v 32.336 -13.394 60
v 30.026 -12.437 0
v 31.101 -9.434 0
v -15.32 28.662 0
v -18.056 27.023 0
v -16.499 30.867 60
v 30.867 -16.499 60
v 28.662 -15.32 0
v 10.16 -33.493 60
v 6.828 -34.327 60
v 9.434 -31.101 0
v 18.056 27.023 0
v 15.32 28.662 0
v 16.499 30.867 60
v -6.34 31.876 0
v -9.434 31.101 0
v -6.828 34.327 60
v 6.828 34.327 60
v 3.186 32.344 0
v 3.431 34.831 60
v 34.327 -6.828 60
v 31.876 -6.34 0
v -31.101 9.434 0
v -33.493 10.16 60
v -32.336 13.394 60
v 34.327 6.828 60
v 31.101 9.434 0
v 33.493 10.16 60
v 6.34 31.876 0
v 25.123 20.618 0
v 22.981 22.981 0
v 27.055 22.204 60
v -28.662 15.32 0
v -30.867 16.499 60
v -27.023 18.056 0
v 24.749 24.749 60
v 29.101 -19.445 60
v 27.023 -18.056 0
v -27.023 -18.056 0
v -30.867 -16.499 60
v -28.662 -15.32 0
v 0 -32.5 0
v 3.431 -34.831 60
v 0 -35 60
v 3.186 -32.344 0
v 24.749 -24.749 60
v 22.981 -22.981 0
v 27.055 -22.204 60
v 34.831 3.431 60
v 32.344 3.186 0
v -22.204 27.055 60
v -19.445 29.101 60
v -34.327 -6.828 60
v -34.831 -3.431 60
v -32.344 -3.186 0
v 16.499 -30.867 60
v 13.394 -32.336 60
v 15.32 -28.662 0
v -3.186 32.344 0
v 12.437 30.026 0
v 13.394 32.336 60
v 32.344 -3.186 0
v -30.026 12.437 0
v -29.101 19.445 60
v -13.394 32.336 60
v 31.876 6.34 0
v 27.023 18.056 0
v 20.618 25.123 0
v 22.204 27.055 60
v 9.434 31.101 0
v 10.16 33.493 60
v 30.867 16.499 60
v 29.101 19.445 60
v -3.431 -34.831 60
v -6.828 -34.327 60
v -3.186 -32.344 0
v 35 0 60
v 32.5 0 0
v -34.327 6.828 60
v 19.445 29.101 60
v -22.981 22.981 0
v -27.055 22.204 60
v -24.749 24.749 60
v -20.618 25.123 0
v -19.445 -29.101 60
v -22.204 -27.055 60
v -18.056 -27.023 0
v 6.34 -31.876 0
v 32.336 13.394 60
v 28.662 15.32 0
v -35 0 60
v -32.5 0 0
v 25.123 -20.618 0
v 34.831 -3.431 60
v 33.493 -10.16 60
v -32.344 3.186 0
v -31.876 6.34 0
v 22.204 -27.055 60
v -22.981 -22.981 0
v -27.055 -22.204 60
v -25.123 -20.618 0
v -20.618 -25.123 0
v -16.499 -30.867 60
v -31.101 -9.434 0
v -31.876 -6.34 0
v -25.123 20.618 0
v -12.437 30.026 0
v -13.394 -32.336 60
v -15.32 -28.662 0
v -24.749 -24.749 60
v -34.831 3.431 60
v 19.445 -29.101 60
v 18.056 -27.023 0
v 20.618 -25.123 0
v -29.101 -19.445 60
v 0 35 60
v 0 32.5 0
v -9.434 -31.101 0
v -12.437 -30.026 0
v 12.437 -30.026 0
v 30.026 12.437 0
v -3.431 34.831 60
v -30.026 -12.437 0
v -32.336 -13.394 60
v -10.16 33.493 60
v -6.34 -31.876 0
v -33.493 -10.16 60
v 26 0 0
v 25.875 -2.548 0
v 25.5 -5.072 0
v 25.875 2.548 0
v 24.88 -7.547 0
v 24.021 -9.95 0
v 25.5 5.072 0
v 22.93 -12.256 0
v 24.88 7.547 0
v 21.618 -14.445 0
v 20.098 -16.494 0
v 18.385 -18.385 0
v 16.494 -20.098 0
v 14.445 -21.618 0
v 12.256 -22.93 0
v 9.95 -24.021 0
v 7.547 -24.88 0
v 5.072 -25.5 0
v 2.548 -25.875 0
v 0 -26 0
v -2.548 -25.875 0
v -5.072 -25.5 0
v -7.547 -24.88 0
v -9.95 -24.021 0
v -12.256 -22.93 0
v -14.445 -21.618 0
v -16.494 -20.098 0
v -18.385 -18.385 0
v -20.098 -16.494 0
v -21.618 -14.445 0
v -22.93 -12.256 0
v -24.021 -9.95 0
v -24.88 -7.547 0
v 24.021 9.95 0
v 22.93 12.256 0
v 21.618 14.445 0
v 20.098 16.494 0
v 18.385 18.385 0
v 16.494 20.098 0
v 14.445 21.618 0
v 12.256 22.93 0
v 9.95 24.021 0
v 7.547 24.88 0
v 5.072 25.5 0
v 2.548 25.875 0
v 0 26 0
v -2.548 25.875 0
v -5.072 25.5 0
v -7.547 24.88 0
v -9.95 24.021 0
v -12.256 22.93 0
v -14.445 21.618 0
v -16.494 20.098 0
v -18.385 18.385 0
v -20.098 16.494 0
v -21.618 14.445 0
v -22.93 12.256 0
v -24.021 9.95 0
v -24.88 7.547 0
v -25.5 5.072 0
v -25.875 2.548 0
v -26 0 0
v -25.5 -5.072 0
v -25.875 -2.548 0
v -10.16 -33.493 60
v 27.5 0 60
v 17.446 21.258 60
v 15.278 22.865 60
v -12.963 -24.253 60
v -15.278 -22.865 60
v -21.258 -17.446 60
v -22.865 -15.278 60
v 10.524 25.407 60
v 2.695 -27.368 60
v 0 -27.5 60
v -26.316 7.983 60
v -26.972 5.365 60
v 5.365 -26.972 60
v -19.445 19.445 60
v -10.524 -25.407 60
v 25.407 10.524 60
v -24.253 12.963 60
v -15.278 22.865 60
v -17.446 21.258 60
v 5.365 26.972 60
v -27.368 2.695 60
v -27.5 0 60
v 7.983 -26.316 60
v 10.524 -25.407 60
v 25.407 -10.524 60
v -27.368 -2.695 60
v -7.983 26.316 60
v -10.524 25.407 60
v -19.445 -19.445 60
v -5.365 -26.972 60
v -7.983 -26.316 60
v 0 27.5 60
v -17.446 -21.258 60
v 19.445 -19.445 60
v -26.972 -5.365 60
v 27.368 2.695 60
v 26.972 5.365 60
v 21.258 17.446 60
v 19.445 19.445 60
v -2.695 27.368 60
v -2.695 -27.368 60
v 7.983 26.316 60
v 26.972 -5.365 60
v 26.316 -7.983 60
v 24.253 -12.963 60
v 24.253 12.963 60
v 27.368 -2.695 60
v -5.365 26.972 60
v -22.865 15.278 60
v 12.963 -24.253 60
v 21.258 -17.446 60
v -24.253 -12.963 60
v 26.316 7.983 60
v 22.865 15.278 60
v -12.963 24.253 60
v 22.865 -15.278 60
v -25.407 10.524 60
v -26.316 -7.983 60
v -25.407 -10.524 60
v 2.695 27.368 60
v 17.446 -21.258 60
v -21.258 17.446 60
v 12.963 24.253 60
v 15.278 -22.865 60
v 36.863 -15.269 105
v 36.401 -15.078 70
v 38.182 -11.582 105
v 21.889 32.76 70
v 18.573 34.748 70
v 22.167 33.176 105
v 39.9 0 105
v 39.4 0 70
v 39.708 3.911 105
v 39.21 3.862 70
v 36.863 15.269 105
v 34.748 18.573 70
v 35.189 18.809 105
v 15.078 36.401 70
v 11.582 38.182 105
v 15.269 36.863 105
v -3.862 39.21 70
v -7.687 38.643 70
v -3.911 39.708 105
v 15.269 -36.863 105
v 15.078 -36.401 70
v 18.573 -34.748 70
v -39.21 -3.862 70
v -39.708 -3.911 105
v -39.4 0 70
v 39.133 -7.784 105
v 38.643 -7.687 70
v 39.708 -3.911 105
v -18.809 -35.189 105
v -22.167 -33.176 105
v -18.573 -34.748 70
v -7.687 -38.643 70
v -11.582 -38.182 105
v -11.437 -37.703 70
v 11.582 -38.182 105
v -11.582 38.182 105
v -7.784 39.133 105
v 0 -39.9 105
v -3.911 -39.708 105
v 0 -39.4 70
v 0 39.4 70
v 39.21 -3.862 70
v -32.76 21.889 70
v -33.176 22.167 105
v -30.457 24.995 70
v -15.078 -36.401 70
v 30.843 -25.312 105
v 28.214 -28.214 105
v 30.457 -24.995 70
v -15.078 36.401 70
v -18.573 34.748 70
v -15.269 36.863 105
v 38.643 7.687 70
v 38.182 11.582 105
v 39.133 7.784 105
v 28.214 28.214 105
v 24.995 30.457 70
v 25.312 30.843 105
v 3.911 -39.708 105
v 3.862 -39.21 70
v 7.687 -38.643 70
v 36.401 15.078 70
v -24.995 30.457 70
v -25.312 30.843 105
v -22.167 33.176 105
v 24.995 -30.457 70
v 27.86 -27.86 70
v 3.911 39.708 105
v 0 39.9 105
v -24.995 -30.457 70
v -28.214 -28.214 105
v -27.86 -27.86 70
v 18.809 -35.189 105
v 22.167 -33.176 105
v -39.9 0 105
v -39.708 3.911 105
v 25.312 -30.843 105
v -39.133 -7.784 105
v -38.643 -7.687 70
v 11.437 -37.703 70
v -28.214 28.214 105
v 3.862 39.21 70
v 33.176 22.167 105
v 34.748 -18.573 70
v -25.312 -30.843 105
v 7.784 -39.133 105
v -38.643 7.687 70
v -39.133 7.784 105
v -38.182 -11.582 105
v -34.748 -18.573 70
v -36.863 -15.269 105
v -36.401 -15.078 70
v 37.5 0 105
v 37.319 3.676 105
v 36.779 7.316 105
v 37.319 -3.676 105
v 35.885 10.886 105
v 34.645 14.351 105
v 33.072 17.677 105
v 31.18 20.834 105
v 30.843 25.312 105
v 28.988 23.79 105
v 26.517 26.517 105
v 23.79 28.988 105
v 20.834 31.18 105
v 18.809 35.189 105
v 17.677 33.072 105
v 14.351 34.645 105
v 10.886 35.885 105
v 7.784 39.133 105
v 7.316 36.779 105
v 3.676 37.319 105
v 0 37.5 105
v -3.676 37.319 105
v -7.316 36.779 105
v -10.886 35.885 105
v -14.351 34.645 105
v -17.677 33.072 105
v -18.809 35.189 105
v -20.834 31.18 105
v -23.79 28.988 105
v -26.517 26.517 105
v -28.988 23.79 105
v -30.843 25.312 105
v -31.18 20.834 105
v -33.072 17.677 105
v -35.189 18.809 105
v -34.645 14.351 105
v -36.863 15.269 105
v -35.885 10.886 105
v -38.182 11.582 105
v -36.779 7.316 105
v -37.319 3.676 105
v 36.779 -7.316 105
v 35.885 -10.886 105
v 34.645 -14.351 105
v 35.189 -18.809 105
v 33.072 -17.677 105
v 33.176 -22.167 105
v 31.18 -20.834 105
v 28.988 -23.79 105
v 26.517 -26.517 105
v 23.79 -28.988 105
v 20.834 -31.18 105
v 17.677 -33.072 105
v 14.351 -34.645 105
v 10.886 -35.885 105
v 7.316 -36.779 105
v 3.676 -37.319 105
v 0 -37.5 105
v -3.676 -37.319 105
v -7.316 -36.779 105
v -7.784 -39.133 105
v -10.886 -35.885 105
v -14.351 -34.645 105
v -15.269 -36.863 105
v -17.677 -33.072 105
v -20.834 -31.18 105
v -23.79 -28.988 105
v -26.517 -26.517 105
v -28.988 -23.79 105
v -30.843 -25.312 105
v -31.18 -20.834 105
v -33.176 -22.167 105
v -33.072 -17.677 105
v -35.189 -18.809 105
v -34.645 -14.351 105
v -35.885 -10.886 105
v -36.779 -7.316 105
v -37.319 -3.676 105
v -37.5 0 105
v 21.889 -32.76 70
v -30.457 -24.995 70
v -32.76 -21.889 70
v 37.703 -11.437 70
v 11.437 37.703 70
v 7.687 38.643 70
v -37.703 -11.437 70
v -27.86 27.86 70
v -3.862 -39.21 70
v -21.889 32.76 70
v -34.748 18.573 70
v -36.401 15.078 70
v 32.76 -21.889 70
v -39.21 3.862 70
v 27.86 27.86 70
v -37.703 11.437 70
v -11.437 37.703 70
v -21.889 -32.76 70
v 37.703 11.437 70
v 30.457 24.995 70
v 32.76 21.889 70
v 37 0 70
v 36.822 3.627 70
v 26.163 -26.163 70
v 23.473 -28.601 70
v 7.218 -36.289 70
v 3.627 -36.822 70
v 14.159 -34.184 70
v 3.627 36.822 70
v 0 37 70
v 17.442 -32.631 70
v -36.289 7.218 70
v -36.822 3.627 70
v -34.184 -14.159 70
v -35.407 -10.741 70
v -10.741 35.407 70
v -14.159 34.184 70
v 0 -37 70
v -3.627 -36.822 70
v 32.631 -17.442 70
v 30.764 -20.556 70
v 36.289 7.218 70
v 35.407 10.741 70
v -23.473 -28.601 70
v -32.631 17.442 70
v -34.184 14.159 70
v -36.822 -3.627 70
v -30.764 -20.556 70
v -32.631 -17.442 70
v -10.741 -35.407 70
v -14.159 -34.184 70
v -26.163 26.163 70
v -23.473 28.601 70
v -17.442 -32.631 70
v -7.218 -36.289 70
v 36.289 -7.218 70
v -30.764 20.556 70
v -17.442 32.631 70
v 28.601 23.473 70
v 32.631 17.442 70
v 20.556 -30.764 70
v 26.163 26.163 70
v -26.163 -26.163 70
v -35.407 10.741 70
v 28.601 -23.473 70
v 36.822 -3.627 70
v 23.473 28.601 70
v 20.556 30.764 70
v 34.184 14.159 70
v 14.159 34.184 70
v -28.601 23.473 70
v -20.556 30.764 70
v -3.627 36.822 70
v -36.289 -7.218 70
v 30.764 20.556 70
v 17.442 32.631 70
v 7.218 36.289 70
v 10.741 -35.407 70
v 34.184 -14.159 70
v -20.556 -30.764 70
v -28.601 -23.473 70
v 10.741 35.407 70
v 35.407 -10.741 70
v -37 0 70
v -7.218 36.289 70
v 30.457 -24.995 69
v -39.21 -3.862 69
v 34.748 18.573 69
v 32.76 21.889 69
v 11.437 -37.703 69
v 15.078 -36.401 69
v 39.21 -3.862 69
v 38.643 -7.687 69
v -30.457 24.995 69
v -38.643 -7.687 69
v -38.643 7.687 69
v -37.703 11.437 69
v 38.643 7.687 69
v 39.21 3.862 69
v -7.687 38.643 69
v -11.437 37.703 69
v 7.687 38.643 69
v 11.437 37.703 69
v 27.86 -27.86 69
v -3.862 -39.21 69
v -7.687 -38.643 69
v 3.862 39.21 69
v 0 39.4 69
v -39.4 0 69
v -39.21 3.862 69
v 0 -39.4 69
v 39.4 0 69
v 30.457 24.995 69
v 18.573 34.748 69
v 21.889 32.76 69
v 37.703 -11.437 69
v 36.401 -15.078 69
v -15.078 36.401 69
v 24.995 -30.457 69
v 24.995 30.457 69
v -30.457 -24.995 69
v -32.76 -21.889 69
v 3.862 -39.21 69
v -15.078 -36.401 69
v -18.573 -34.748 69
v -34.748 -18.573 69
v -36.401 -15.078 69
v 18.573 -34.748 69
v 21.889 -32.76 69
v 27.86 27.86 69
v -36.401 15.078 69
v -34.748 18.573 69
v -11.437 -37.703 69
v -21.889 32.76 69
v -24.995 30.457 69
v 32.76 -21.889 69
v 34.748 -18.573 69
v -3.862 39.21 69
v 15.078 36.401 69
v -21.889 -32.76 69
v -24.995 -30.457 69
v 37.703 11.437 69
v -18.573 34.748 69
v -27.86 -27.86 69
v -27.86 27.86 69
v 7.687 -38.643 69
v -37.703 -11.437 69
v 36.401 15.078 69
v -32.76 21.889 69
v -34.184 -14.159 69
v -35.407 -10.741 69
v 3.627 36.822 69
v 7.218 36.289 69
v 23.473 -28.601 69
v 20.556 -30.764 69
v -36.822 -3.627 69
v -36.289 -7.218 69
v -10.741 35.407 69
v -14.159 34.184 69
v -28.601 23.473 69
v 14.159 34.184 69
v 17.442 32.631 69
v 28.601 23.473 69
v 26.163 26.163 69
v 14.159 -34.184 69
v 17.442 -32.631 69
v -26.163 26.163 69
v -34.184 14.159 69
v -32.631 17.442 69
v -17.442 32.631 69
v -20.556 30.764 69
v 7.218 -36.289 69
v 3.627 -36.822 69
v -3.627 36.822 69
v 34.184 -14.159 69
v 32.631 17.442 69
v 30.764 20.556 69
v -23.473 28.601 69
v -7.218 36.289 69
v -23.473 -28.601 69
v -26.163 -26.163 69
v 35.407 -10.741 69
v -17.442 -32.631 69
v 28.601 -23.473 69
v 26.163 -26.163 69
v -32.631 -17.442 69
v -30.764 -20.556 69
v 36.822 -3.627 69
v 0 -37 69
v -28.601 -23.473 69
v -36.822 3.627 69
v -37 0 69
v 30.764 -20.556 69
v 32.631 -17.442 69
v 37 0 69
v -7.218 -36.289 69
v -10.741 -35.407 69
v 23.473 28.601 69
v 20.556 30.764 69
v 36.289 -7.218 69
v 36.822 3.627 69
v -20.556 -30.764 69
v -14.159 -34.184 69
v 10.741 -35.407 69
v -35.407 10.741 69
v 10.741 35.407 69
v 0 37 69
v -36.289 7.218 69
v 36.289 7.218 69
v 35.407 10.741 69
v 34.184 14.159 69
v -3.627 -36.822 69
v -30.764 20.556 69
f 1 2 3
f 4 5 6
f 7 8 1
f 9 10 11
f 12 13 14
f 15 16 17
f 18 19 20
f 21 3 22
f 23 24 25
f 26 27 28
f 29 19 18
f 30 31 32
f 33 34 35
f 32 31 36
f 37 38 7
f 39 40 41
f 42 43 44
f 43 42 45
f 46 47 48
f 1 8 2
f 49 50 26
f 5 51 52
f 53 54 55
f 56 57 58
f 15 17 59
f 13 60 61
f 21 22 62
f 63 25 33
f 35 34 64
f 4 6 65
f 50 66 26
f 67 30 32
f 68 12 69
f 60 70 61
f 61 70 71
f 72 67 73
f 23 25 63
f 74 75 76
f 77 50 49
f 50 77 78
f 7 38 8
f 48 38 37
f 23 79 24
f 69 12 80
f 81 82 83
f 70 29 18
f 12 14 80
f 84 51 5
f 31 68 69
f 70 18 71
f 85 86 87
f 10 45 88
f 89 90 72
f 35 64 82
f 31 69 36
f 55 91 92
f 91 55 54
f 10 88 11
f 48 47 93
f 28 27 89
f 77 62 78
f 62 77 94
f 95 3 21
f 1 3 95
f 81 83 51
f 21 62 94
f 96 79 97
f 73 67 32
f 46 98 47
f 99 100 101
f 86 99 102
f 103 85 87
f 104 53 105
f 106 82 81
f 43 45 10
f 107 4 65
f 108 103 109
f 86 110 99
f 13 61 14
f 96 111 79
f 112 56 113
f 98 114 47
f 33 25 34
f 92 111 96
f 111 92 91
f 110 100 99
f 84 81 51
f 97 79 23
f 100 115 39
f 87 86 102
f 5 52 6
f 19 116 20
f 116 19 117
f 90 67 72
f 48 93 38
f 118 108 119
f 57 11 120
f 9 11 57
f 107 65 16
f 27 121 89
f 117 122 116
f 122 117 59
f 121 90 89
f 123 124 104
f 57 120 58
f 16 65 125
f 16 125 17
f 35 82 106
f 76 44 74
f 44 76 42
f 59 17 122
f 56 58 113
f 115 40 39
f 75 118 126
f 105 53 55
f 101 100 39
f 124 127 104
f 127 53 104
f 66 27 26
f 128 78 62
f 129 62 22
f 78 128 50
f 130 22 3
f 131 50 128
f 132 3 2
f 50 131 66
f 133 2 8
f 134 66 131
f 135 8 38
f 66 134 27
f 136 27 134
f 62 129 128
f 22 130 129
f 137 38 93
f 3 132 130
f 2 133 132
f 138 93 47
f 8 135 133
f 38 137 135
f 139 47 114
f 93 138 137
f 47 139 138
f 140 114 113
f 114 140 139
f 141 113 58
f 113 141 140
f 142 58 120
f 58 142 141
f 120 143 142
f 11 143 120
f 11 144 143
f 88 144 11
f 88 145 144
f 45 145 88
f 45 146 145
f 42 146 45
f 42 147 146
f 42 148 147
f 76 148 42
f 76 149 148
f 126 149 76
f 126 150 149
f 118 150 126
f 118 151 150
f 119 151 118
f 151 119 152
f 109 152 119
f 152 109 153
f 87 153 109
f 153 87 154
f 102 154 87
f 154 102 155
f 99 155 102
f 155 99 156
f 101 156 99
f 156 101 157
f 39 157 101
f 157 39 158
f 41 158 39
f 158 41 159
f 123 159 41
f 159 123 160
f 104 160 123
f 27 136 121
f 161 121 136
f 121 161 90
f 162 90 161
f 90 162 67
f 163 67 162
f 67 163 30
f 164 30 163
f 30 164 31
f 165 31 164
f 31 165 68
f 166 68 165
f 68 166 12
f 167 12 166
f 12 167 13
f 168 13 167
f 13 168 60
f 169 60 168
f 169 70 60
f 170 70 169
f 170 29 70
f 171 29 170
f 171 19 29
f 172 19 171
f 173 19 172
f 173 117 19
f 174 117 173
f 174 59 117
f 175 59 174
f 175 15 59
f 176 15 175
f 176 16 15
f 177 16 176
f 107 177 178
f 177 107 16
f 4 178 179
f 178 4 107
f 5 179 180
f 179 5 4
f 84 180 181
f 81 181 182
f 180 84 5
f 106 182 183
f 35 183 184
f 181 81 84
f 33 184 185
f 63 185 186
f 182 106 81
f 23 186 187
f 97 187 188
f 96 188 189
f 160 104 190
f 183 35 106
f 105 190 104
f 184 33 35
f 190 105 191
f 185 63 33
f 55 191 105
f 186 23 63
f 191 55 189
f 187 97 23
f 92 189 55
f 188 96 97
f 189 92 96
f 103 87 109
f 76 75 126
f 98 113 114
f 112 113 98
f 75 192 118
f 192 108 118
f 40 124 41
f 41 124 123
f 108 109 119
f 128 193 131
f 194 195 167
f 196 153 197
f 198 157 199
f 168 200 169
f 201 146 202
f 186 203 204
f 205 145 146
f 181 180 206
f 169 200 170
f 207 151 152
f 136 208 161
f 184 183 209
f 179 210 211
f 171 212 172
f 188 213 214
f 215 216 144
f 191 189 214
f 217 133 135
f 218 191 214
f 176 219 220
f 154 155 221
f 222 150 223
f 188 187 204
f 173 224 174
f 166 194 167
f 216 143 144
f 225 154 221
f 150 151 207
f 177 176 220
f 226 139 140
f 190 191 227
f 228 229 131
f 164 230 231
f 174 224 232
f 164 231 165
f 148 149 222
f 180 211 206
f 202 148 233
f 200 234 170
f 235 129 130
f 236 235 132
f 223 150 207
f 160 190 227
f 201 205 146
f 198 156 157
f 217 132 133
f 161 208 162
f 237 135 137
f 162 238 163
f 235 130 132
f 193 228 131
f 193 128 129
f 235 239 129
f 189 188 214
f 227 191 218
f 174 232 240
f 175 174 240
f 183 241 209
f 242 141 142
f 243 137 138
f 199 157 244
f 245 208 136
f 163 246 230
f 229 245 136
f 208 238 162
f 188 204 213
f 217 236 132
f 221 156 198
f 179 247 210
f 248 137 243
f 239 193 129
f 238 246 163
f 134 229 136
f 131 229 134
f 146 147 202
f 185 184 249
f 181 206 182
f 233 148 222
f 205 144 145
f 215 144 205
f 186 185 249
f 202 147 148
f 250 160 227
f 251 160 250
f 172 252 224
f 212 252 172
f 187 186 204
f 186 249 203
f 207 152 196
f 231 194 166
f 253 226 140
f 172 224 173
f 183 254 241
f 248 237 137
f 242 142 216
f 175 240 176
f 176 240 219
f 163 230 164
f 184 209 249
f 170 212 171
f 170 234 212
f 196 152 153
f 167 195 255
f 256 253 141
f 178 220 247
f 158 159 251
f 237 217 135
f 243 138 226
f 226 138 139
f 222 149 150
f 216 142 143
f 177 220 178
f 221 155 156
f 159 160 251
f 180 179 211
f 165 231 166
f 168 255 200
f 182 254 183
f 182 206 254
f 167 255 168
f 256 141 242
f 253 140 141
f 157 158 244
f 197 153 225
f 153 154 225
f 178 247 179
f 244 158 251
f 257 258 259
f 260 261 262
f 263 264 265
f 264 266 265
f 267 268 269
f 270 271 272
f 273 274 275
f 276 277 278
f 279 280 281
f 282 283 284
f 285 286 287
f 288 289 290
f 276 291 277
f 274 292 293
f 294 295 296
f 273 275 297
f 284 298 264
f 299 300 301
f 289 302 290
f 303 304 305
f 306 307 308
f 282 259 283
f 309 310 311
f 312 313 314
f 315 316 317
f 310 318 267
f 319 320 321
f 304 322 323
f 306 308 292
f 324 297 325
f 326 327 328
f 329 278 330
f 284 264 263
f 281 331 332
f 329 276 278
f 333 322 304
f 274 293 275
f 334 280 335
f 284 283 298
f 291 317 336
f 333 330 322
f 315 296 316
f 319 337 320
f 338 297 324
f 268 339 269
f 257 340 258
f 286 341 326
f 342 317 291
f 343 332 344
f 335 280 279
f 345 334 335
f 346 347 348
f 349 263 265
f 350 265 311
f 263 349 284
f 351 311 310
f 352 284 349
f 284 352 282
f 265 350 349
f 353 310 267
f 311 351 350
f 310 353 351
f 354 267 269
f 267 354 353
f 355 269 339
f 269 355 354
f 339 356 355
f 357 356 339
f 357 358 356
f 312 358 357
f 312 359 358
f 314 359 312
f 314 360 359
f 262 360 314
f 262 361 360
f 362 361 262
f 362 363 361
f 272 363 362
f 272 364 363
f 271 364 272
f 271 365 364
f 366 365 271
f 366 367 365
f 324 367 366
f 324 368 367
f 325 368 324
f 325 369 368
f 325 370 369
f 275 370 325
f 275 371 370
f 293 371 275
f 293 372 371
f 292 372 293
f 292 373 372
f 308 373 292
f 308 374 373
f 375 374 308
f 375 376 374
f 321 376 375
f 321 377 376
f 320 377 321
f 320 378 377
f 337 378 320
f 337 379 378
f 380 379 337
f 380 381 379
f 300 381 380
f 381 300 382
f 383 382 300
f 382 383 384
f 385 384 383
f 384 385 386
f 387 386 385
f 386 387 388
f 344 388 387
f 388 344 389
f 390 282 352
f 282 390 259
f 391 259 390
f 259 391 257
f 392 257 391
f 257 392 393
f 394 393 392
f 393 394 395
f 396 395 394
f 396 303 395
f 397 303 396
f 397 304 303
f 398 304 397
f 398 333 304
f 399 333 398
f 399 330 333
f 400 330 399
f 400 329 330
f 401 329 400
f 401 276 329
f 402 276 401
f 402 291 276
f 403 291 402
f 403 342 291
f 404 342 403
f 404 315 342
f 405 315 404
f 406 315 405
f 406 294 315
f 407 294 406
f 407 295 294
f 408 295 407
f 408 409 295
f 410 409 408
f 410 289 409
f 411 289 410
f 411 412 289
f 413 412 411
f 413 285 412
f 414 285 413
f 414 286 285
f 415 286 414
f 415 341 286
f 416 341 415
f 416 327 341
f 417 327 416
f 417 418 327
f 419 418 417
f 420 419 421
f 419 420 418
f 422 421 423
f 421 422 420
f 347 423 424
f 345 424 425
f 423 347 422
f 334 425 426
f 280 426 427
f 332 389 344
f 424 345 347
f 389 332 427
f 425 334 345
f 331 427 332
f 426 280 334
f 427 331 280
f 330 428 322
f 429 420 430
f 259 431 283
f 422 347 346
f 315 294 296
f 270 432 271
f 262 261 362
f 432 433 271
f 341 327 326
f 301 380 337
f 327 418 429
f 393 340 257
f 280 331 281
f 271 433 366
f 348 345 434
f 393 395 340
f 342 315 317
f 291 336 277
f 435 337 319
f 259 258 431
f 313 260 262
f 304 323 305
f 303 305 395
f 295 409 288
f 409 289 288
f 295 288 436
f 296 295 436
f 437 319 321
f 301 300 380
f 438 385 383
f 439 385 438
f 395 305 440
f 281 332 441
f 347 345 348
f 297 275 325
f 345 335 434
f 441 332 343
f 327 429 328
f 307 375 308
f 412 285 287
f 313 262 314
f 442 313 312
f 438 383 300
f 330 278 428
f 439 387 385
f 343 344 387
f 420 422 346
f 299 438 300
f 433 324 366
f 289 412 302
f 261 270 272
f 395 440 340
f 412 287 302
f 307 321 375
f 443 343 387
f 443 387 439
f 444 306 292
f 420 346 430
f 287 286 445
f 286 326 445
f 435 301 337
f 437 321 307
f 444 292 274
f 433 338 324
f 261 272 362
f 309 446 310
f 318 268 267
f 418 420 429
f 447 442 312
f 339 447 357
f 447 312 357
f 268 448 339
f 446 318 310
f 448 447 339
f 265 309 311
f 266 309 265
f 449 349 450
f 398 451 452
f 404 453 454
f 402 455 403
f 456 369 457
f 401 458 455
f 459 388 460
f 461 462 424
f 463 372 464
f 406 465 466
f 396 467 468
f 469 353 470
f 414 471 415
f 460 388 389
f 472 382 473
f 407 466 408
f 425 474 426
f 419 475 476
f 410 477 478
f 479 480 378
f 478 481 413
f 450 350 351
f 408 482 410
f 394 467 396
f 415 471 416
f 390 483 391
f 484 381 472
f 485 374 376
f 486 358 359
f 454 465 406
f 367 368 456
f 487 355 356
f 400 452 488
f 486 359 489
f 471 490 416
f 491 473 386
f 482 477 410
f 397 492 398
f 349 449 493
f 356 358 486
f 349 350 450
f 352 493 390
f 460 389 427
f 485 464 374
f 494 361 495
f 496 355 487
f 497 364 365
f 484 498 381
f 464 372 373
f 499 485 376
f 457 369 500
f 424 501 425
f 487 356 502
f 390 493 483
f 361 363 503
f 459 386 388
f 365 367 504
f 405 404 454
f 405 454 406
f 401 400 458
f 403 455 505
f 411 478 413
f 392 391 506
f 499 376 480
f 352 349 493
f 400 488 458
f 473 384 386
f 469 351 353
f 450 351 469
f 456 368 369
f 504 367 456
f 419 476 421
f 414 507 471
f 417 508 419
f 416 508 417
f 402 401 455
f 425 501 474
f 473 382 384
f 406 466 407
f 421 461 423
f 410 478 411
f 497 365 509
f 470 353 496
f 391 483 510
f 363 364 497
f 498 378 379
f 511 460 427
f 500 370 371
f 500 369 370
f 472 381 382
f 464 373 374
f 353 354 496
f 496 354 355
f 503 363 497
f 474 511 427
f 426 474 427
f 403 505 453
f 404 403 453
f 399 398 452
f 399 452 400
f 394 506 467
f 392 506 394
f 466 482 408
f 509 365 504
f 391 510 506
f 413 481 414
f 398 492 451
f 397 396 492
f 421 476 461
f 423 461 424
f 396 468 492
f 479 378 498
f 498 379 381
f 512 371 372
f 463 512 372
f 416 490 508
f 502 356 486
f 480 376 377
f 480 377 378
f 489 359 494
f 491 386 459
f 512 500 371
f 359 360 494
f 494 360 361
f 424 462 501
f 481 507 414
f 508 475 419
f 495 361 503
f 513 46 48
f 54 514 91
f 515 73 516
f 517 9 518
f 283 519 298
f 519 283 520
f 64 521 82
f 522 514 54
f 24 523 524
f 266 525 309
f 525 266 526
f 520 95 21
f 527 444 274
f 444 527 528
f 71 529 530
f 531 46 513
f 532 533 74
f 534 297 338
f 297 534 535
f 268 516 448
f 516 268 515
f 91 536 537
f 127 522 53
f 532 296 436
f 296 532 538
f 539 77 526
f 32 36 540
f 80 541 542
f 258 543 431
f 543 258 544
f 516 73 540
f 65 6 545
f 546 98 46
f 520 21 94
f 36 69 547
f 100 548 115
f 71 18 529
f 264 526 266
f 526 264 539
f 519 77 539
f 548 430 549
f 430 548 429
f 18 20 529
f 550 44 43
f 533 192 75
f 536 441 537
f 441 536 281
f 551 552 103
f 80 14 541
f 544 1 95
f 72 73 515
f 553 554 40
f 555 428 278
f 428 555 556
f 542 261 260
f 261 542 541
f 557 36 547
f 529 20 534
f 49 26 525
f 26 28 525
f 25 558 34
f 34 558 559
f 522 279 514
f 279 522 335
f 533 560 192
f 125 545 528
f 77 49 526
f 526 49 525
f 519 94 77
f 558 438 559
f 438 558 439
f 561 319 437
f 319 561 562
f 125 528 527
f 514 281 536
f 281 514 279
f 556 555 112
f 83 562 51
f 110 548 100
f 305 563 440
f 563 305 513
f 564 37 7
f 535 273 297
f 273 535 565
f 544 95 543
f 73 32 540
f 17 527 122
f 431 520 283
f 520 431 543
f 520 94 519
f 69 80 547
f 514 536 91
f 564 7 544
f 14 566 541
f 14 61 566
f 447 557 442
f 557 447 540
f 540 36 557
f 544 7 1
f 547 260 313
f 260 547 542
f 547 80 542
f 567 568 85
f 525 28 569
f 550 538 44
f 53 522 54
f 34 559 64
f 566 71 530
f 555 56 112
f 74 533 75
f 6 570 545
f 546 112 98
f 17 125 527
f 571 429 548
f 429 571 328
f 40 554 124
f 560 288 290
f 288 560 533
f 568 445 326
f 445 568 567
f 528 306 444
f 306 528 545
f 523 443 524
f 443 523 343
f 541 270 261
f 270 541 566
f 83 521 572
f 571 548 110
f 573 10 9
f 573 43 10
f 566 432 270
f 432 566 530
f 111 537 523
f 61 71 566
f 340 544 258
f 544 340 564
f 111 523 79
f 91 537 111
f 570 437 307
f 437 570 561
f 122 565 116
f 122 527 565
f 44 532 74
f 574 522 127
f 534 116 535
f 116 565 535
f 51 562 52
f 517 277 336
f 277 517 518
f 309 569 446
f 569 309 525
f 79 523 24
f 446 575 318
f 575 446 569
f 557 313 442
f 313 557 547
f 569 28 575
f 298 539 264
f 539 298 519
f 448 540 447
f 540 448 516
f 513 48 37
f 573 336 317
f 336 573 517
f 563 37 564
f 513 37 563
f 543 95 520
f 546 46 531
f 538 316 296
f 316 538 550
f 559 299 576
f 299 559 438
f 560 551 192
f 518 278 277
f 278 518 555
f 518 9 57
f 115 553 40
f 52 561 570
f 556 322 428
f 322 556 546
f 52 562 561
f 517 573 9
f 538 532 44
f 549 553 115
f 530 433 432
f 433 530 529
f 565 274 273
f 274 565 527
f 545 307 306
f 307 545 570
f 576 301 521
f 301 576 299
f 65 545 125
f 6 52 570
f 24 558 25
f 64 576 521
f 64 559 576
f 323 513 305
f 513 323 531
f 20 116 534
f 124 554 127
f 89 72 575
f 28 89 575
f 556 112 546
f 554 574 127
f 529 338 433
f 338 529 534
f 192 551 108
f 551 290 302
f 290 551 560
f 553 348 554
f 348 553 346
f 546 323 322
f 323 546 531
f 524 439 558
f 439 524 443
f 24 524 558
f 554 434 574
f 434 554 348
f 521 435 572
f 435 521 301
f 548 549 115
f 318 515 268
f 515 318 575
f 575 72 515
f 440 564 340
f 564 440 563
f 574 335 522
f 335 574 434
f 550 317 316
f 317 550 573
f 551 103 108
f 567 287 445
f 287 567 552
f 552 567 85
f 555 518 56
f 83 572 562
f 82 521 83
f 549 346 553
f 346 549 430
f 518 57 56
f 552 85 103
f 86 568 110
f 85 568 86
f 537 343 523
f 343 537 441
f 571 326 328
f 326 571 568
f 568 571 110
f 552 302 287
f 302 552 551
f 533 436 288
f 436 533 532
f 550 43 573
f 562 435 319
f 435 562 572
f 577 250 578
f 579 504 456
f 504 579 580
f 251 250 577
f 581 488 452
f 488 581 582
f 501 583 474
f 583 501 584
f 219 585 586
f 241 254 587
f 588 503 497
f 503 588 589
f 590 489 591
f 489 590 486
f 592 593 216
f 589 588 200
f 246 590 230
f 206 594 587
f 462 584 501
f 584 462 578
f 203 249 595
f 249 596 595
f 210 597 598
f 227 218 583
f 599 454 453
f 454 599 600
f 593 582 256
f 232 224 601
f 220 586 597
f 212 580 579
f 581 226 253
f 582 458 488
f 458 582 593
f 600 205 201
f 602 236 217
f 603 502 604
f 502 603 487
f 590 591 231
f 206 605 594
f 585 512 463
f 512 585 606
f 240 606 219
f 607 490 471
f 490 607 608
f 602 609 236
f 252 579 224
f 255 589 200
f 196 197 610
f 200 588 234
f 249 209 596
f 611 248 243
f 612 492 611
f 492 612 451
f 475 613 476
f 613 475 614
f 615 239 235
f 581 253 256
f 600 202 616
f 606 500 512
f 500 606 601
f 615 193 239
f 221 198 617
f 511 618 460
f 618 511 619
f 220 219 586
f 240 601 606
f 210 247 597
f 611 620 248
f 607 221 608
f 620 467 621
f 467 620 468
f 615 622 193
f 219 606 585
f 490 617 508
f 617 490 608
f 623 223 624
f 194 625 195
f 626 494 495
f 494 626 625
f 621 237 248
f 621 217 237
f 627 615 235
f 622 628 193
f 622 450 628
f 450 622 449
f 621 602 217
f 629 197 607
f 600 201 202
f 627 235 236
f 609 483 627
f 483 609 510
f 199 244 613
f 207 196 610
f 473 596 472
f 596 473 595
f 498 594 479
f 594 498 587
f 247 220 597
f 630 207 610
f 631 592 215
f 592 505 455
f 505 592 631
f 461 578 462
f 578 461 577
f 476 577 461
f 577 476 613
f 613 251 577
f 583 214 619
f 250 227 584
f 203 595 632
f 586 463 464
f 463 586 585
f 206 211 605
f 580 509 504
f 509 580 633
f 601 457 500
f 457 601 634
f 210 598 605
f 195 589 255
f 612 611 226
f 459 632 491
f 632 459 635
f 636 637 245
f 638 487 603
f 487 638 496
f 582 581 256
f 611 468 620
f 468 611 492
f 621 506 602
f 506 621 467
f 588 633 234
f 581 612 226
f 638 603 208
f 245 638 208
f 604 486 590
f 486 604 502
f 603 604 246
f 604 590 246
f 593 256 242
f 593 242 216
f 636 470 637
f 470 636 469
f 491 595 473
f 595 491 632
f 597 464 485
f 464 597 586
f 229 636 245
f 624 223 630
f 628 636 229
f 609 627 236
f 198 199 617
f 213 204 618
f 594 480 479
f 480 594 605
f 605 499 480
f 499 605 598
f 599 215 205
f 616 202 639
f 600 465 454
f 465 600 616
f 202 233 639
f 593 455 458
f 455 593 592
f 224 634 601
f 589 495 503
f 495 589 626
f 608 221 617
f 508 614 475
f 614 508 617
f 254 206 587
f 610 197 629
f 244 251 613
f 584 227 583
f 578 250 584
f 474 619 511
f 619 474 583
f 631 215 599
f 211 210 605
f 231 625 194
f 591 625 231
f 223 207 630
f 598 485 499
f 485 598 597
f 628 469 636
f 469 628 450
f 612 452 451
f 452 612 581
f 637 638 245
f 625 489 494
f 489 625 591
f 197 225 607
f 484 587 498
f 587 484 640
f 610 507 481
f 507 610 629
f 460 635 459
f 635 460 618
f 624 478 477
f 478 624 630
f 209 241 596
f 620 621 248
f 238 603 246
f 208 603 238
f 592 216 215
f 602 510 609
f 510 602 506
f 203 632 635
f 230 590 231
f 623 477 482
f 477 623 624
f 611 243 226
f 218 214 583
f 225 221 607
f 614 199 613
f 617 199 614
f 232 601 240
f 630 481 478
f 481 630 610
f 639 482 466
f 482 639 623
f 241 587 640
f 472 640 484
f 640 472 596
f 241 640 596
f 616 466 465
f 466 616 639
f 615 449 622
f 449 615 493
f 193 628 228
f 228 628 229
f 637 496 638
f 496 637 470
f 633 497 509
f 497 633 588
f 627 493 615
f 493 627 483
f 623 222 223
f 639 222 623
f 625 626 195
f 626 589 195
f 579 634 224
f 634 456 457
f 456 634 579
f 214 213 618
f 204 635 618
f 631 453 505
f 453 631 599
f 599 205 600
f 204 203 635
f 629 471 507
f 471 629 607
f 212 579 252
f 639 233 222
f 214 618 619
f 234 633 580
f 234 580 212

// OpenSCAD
$fn=64;
bottom = 65;
top = 70;
height = 60;

cutoff = 55;
cutoff2 = 52;
cutoff_offset = 45;

thickness = 2.4;

inner_top = 74;
inner_top2 = 75;
outer_top = inner_top + thickness * 2;;
outer_top2 = inner_top2 + thickness * 2;;
top_h = 35;

connector_h = 10;


module bottom() {
    difference() {
        cylinder(r1=bottom/2, r2=top/2, h=height);
        inner_can();
    }
}


module top() {
    difference() {
        translate([0, 0, height])
            cylinder(h=top_h, r1=outer_top/2, r2=outer_top2/2);
        translate([0, 0, height])
            cylinder(h=top_h, r2=(inner_top2/2), r1=(inner_top/2));
    }
}

module connector() {
    difference() {
        hull() {
            cylinder(r=(top/2), h=1);
            translate([0, 0, connector_h-1])
            cylinder(h=1, r=outer_top/2);
        }
        hull() {
            cylinder(r=(cutoff/2), h=1);
            translate([0, 0, connector_h-1])
            cylinder(h=1, r=(outer_top/2)-(thickness));
        }
    }
}

module inner_can() {
    cylinder(r2=cutoff/2, r1=cutoff2/2, h=height);
}


bottom();
translate([0, 0, connector_h])
    top();

translate([0, 0, height])
    connector();
